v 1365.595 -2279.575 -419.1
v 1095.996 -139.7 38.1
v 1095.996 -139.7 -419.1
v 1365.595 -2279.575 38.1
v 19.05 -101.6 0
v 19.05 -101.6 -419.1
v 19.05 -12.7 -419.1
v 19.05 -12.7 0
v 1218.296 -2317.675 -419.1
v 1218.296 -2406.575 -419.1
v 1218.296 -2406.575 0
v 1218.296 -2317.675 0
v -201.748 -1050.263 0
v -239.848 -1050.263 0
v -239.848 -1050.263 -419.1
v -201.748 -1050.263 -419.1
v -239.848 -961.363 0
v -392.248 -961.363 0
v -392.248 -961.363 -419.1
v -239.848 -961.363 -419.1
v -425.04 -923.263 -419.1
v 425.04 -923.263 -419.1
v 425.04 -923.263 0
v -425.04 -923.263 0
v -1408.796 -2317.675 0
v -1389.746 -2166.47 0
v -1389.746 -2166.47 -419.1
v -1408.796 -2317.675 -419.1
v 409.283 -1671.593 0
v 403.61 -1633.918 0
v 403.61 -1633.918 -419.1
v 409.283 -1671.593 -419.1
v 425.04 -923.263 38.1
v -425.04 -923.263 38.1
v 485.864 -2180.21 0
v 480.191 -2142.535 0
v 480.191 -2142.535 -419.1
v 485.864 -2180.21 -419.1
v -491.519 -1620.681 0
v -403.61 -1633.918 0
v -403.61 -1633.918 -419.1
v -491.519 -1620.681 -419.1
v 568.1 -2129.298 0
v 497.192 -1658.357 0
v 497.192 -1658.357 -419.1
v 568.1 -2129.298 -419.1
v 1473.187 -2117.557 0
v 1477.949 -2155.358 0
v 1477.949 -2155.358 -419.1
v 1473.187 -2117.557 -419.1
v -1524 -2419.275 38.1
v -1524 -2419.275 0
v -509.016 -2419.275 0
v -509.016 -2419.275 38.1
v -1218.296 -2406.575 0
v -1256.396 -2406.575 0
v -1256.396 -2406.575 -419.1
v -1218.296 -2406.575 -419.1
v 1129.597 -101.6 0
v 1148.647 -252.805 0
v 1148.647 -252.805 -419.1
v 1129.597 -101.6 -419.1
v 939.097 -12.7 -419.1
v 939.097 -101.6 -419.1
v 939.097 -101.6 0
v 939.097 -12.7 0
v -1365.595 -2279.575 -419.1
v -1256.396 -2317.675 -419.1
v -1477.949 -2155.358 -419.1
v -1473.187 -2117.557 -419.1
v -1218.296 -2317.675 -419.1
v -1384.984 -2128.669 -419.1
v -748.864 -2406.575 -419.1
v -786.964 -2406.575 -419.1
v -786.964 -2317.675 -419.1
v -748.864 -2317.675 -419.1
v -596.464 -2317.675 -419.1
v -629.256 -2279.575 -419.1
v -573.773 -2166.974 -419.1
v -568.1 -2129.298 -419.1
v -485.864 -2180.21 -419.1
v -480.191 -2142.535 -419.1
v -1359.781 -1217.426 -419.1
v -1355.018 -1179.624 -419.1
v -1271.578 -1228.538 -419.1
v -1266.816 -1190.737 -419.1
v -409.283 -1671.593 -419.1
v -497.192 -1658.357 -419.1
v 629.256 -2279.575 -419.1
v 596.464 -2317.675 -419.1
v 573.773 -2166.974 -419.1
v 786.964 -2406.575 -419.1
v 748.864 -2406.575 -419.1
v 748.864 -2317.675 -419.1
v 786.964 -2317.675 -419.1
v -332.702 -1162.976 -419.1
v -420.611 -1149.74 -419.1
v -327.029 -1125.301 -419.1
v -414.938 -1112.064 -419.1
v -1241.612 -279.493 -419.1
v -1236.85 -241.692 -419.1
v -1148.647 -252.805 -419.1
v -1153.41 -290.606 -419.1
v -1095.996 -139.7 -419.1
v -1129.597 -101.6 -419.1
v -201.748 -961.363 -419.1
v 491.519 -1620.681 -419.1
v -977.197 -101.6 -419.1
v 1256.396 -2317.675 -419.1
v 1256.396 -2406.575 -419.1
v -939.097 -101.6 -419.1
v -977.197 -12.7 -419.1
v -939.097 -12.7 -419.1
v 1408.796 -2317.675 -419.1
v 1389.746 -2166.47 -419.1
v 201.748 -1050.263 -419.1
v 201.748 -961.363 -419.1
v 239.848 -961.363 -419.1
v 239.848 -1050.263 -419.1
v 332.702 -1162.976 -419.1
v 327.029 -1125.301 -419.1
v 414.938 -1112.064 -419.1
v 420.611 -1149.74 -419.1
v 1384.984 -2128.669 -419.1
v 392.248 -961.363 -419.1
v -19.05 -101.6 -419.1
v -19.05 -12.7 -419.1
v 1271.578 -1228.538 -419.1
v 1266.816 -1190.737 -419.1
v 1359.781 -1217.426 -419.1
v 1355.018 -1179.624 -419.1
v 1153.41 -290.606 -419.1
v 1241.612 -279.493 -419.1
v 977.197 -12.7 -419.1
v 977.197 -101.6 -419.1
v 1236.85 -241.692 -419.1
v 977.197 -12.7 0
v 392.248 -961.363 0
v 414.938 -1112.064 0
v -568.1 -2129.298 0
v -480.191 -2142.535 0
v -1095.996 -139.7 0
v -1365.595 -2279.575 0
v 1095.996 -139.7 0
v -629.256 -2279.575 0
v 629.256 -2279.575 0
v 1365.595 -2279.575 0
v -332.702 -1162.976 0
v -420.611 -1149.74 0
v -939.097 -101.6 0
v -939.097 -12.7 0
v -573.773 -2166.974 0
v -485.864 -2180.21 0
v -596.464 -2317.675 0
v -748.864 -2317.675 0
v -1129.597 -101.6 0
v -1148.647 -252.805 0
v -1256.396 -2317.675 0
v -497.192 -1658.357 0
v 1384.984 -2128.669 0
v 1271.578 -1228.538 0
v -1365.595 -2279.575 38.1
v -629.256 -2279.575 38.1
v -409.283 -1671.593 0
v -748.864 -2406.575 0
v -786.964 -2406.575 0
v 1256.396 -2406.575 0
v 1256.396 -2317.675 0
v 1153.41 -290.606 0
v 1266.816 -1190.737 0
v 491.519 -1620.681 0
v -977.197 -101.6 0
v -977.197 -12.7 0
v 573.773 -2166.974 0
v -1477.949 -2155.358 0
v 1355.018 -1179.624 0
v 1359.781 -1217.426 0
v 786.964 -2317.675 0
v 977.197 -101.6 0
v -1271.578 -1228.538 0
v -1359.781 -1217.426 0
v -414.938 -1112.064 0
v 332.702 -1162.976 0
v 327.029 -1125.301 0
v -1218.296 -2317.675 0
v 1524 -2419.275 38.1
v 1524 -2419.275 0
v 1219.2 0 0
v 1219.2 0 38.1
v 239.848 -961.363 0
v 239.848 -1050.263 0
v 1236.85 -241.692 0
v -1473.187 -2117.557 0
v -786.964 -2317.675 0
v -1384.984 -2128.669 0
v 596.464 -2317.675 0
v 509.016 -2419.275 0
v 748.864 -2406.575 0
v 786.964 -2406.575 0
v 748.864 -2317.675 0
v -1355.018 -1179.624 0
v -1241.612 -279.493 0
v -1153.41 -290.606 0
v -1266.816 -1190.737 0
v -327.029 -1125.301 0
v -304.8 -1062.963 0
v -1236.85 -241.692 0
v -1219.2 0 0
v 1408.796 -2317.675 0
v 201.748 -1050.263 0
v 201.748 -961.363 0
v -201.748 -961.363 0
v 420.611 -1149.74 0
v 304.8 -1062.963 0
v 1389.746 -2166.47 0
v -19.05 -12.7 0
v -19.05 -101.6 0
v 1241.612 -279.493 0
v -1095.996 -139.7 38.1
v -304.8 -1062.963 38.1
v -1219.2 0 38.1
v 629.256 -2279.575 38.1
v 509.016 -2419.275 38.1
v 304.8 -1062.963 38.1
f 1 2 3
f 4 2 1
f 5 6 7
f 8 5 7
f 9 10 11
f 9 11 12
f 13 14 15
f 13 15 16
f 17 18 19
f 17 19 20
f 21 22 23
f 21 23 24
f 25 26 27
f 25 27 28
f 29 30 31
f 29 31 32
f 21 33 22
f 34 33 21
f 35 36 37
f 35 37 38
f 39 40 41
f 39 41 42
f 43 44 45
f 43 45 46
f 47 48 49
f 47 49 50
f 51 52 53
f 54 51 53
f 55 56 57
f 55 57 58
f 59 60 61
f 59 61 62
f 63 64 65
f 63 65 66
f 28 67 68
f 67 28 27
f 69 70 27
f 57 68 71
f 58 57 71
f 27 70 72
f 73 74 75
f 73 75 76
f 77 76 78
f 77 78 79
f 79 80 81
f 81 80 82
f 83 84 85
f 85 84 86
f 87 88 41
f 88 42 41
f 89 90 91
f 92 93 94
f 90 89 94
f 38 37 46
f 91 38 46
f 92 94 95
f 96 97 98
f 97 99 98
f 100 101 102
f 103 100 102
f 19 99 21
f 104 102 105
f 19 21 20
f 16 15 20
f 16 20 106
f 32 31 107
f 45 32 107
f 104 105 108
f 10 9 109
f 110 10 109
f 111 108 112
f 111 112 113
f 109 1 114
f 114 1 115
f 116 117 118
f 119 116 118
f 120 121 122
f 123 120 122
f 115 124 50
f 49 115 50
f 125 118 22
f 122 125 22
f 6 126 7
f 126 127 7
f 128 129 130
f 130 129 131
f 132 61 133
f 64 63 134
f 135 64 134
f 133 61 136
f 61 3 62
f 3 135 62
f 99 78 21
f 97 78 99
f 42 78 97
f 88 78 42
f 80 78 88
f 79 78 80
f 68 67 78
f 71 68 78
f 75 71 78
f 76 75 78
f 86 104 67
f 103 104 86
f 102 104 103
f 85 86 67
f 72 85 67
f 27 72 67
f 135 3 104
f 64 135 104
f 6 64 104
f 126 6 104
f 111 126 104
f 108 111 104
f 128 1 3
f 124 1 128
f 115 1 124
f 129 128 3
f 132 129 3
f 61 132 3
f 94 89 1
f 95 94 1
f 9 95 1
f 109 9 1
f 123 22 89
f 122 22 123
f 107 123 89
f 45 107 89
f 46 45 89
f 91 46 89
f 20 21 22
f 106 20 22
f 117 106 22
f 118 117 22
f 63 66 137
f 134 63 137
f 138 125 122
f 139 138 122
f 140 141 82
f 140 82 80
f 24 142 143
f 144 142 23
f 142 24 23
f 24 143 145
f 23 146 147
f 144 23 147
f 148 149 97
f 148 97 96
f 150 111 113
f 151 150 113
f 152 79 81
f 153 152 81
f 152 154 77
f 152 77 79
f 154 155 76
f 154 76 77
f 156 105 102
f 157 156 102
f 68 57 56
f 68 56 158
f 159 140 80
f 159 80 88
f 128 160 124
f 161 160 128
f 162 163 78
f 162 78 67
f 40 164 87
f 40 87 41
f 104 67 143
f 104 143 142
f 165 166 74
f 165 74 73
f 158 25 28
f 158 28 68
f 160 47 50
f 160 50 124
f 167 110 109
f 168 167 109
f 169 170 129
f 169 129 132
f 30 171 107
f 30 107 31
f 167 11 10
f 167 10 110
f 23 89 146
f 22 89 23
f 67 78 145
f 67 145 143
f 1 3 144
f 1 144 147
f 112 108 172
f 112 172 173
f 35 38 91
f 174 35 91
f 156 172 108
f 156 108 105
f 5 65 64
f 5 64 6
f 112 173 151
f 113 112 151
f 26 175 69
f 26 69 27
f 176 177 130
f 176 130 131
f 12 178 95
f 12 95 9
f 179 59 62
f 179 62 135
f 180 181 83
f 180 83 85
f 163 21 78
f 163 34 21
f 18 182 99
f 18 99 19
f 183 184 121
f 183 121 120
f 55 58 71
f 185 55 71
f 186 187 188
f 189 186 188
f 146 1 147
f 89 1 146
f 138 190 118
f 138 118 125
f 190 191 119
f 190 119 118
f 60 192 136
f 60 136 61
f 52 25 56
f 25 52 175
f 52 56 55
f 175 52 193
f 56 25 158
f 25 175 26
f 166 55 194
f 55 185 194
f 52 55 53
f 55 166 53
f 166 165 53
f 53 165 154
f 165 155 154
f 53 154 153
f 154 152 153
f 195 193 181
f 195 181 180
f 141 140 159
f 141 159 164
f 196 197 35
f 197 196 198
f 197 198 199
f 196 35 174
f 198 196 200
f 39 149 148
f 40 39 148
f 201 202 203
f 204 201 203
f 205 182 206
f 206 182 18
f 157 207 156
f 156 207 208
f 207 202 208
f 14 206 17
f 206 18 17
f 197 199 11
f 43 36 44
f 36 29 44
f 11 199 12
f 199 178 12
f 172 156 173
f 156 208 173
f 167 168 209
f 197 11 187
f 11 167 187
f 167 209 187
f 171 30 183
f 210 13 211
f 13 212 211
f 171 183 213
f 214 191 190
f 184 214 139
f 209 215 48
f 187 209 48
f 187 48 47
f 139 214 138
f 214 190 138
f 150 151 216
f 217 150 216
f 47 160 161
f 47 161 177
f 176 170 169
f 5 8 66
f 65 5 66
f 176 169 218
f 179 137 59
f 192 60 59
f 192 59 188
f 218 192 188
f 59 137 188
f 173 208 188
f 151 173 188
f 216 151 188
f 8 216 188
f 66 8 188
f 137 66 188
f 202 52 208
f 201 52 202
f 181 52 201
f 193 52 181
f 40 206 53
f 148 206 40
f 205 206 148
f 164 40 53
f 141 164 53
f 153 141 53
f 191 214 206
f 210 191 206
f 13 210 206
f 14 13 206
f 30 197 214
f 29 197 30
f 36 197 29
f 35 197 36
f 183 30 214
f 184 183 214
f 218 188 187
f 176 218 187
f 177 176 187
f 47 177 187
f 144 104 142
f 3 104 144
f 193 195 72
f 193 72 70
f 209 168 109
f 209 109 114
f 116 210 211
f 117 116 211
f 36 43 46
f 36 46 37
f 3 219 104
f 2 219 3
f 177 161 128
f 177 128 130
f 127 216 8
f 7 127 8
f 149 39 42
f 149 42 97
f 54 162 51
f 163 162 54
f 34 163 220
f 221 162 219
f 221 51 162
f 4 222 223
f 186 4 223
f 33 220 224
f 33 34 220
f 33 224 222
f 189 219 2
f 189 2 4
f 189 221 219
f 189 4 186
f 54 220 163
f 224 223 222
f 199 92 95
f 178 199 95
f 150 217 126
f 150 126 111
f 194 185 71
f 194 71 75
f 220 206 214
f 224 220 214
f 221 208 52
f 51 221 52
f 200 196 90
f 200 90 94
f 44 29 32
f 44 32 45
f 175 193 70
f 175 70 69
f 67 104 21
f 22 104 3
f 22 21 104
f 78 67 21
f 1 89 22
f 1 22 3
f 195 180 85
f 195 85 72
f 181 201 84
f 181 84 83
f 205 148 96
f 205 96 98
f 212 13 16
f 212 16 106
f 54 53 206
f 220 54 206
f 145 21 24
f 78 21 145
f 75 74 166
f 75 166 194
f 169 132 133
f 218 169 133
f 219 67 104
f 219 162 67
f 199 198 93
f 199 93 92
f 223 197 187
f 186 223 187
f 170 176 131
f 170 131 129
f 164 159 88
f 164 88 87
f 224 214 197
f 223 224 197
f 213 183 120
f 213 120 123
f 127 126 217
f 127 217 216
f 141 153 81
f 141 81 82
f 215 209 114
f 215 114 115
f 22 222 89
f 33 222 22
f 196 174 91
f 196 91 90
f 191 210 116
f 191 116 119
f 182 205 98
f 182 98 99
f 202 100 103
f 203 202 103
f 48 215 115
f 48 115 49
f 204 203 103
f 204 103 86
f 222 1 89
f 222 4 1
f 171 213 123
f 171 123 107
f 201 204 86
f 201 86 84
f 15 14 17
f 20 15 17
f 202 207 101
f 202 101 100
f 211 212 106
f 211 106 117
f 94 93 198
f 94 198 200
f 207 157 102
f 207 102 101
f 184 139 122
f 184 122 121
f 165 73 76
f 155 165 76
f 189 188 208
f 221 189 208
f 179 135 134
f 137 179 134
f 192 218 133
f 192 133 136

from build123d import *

# Parameters (mm, degrees)
F1_DEPTH = 38.1
F3_DEPTH = 38.101
F5_DEPTH = 419.1
F6_W     = 38.1
F6_H     = 88.9
F7_DEPTH = 419.1
F9_DEPTH = 419.1


with BuildPart() as f1:
    # F0 (on Top) → F1 (new body)
    with BuildSketch(Plane.XY):
        Polygon((1219.2, 0), (-1219.2, 0), (-1524, -2419.2749988375), (-509.016, -2419.2749988375), (-304.8, -1062.9629457523), (304.8, -1062.9629457523), (509.016, -2419.2749988375), (1524, -2419.2749988375), align=None)
    extrude(amount=F1_DEPTH)

    # F2 (on face) → F3 (cut, through all)
    with BuildSketch(Plane.XY.offset(38.1)):
        Polygon((1095.9961806148, -139.7), (-1095.9961806148, -139.7), (-1365.5950893618, -2279.5749988375), (-629.256430238, -2279.5749988375), (-425.040430238, -923.2629457523), (425.040430238, -923.2629457523), (629.256430238, -2279.5749988375), (1365.5950893618, -2279.5749988375), align=None)
    extrude(amount=-F3_DEPTH, mode=Mode.SUBTRACT)

    # F4 (on face) → F5 (join)
    with BuildSketch(Plane.XY):
        Polygon((-1129.5972222653, -101.6), (-1408.7964286268, -2317.6749988375), (-596.4635856277, -2317.6749988375), (-392.2475856277, -961.3629457523), (392.2475856277, -961.3629457523), (596.4635856277, -2317.6749988375), (1408.7964286268, -2317.6749988375), (1129.5972222653, -101.6), align=None)
        Polygon((-629.256430238, -2279.5749988375), (-1365.5950893618, -2279.5749988375), (-1095.9961806148, -139.7), (1095.9961806148, -139.7), (1365.5950893618, -2279.5749988374), (629.256430238, -2279.5749988375), (425.040430238, -923.2629457523), (-425.040430238, -923.2629457523), align=None, mode=Mode.SUBTRACT)
    extrude(amount=-F5_DEPTH)

    # F6 (on face) → F7 (join, through all)
    with BuildSketch(Plane.XY):
        with Locations((-1237.3464286268, -2362.1249988375)):
            Rectangle(F6_W, F6_H)
        with Locations((-767.9135856277, -2362.1249988375)):
            Rectangle(F6_W, F6_H)
        with Locations((767.9135856277, -2362.1249988375)):
            Rectangle(F6_W, F6_H)
        with Locations((1237.3464286268, -2362.1249988375)):
            Rectangle(F6_W, F6_H)
        Polygon((-568.1002522943, -2129.2983247979), (-573.772918961, -2166.9736596058), (-485.8638044092, -2180.209881828), (-480.1911377425, -2142.5345470201), align=None)
        Polygon((-414.9382522943, -1112.064284984), (-420.610918961, -1149.7396197919), (-332.7018044092, -1162.9758420142), (-327.0291377425, -1125.3005072062), align=None)
        with Locations((-220.7975856277, -1005.8129457523)):
            Rectangle(F6_W, F6_H)
        with Locations((220.7975856277, -1005.8129457523)):
            Rectangle(F6_W, F6_H)
        Polygon((480.1911377425, -2142.5345470201), (485.8638044092, -2180.209881828), (573.772918961, -2166.9736596058), (568.1002522943, -2129.2983247979), align=None)
        Polygon((327.0291377425, -1125.3005072062), (332.7018044092, -1162.9758420142), (420.610918961, -1149.7396197919), (414.9382522943, -1112.064284984), align=None)
        Polygon((-1473.1866629594, -2117.5566395533), (-1477.9491629594, -2155.3578114101), (-1389.7464286268, -2166.4703114101), (-1384.9839286268, -2128.6691395533), align=None)
        Polygon((-1236.8499565979, -241.6921874273), (-1241.6124565979, -279.4933592842), (-1153.4097222653, -290.6058592842), (-1148.6472222653, -252.8046874273), align=None)
        with Locations((-958.1472222653, -57.15)):
            Rectangle(F6_W, F6_H)
        with Locations((958.1472222653, -57.15)):
            Rectangle(F6_W, F6_H)
        Polygon((1148.6472222653, -252.8046874273), (1153.4097222653, -290.6058592842), (1241.6124565979, -279.4933592842), (1236.8499565979, -241.6921874273), align=None)
        Polygon((1384.9839286268, -2128.6691395533), (1389.7464286268, -2166.4703114101), (1477.9491629594, -2155.3578114101), (1473.1866629594, -2117.5566395533), align=None)
        Polygon((-491.5192522943, -1620.6813048909), (-497.191918961, -1658.3566396989), (-409.2828044092, -1671.5928619211), (-403.6101377425, -1633.9175271132), align=None)
        Polygon((403.6101377425, -1633.9175271132), (409.2828044092, -1671.5928619211), (497.191918961, -1658.3566396989), (491.5192522943, -1620.6813048909), align=None)
        Polygon((1266.815575446, -1190.7369134903), (1271.578075446, -1228.5380853471), (1359.7808097786, -1217.4255853471), (1355.0183097786, -1179.6244134903), align=None)
        Polygon((-1355.0183097786, -1179.6244134903), (-1359.7808097786, -1217.4255853471), (-1271.578075446, -1228.5380853471), (-1266.815575446, -1190.7369134903), align=None)
        with Locations((0, -57.15)):
            Rectangle(F6_W, F6_H)
    extrude(amount=-F7_DEPTH)


with BuildPart() as f9:
    # F8 (on face) → F9 (new body, through all)
    with BuildSketch(Plane(origin=(0, 0, -419.1), x_dir=(1, 0, 0), z_dir=(0, 0, -1))):
        Polygon((-629.256430238, 2279.5749988375), (-1365.5950893618, 2279.5749988375), (-1095.9961806148, 139.7), (1095.9961806148, 139.7), (1365.5950893618, 2279.5749988374), (629.256430238, 2279.5749988375), (425.040430238, 923.2629457523), (-425.040430238, 923.2629457523), align=None)
    extrude(amount=-F9_DEPTH)


solid = Compound([f1.part, f9.part])
